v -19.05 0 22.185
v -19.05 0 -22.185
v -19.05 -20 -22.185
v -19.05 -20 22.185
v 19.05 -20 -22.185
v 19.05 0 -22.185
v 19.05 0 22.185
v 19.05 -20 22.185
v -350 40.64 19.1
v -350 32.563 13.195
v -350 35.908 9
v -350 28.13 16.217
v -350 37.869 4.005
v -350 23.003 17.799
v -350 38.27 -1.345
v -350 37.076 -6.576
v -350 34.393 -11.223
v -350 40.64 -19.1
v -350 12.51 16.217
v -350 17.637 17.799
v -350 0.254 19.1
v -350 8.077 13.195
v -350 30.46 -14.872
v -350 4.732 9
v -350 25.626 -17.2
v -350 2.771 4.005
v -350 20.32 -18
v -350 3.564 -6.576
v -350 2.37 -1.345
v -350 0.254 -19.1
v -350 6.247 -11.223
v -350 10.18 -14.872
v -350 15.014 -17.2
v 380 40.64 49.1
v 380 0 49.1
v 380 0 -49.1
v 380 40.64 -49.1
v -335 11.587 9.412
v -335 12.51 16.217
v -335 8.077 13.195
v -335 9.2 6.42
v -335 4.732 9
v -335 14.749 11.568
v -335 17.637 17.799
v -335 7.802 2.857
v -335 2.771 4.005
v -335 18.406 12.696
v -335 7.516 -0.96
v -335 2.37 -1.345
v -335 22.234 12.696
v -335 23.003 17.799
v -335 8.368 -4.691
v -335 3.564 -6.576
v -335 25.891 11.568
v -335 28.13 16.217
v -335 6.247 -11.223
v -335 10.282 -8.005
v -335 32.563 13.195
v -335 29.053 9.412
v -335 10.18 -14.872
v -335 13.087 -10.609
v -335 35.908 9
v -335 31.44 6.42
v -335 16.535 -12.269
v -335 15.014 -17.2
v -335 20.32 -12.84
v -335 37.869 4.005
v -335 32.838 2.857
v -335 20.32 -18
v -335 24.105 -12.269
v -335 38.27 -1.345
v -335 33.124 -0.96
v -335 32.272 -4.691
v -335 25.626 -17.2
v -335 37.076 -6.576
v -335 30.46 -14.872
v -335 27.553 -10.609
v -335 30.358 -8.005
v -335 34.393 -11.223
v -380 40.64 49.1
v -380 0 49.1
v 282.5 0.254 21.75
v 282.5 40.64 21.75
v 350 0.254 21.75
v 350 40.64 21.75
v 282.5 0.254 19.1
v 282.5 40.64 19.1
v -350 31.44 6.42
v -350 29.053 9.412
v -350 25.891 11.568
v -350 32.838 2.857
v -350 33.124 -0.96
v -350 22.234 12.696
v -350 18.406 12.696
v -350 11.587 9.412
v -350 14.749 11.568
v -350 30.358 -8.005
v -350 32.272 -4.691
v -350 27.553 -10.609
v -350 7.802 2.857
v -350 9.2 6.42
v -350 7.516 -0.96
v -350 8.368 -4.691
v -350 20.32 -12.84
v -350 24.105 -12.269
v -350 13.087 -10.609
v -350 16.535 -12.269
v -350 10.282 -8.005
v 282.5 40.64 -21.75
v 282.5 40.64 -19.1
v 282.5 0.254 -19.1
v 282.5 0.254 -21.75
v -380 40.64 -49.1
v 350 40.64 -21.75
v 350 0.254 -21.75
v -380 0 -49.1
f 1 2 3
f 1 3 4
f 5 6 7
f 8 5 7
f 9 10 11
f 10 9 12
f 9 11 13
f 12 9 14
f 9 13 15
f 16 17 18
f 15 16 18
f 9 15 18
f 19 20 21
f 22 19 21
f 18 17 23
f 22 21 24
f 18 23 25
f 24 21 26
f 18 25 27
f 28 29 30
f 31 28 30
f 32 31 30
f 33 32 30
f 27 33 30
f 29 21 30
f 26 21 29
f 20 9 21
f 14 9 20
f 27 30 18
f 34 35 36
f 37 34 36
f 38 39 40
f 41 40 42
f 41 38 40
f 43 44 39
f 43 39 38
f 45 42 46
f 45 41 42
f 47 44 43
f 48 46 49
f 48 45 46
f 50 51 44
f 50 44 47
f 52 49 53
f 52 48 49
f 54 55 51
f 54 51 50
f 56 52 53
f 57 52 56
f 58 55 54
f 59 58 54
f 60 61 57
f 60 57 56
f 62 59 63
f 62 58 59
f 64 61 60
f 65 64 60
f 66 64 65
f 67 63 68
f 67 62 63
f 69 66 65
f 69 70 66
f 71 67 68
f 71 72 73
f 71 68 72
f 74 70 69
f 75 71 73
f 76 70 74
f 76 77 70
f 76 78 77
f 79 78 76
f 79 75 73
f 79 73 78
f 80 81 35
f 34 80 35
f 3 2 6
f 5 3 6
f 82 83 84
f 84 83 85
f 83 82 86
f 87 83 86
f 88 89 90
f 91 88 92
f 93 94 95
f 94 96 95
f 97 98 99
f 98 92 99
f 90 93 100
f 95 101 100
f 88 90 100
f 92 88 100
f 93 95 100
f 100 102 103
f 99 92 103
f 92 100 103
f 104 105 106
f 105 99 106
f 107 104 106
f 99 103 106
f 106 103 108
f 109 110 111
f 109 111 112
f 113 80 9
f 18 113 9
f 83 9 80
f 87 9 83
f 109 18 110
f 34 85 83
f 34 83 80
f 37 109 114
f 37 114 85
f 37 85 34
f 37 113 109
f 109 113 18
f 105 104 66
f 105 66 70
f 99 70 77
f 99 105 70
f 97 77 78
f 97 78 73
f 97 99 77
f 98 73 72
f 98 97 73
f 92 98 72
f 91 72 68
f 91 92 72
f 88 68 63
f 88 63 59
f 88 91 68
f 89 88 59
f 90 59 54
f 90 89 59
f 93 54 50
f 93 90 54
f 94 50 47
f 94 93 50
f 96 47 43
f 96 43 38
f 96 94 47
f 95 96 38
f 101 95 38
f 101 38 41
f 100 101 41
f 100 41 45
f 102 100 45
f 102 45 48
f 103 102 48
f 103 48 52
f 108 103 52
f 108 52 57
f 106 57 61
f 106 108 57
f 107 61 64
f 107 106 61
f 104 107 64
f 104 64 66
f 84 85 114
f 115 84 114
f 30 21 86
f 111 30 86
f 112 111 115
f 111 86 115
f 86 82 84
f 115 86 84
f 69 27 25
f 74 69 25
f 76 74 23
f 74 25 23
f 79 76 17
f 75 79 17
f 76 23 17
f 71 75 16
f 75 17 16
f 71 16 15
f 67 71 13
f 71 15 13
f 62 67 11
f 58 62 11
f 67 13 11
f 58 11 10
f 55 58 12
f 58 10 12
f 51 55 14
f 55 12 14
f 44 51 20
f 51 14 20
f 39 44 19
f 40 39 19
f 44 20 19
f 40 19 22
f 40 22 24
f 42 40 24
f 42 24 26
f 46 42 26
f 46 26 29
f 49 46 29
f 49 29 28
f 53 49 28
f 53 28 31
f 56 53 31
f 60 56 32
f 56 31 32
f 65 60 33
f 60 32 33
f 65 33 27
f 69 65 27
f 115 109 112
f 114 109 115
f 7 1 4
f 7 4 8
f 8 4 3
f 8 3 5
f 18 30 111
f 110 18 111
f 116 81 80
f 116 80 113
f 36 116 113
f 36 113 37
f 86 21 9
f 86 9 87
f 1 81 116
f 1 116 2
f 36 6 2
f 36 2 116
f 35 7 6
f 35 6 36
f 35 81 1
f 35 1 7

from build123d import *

# Parameters (mm, degrees)
SKETCH1_W           = 760
SKETCH1_H           = 98.2
SKETCH1_W_2         = 700
SKETCH1_H_2         = 38.2
BOSS_EXTRUDE3_DEPTH = 40.64
SKETCH2_W           = 700
SKETCH2_H           = 38.2
BOSS_EXTRUDE4_DEPTH = 0.254
SKETCH3_W           = 67.5
SKETCH3_H           = 43.5
CUT_EXTRUDE1_DEPTH  = 40.386
SKETCH6_R           = 18
SKETCH6_R_2         = 12.8397
BOSS_EXTRUDE5_DEPTH = 15
SKETCH7_W           = 38.1
SKETCH7_H           = 44.37
BOSS_EXTRUDE6_DEPTH = 20


with BuildPart() as part:
    # Sketch1 → Boss-Extrude3 (new body)
    with BuildSketch(Plane(origin=(0, 0, 0), x_dir=(1, 0, 0), z_dir=(0, 1, 0))):
        Rectangle(SKETCH1_W, SKETCH1_H)
        Rectangle(SKETCH1_W_2, SKETCH1_H_2, mode=Mode.SUBTRACT)
    extrude(amount=BOSS_EXTRUDE3_DEPTH)

    # Sketch2 → Boss-Extrude4 (add)
    with BuildSketch(Plane.XZ):
        Rectangle(SKETCH2_W, SKETCH2_H)
    extrude(amount=-BOSS_EXTRUDE4_DEPTH)

    # Sketch3 → Cut-Extrude1 (cut)
    with BuildSketch(Plane(origin=(0, 40.64, 0), x_dir=(1, 0, 0), z_dir=(0, 1, 0))):
        with Locations((316.25, 0)):
            Rectangle(SKETCH3_W, SKETCH3_H)
    extrude(amount=-CUT_EXTRUDE1_DEPTH, mode=Mode.SUBTRACT)

    # Sketch6 → Boss-Extrude5 (add)
    with BuildSketch(Plane(origin=(-350, 0, 0), x_dir=(0, 0, -1), z_dir=(1, 0, 0))):
        with Locations((0, 20.32)):
            Circle(SKETCH6_R)
        with Locations((0, 20.32)):
            Circle(SKETCH6_R_2, mode=Mode.SUBTRACT)
    extrude(amount=BOSS_EXTRUDE5_DEPTH)

    # Sketch7 → Boss-Extrude6 (add)
    with BuildSketch(Plane.XZ):
        Rectangle(SKETCH7_W, SKETCH7_H)
    extrude(amount=BOSS_EXTRUDE6_DEPTH)


solid = part.part
